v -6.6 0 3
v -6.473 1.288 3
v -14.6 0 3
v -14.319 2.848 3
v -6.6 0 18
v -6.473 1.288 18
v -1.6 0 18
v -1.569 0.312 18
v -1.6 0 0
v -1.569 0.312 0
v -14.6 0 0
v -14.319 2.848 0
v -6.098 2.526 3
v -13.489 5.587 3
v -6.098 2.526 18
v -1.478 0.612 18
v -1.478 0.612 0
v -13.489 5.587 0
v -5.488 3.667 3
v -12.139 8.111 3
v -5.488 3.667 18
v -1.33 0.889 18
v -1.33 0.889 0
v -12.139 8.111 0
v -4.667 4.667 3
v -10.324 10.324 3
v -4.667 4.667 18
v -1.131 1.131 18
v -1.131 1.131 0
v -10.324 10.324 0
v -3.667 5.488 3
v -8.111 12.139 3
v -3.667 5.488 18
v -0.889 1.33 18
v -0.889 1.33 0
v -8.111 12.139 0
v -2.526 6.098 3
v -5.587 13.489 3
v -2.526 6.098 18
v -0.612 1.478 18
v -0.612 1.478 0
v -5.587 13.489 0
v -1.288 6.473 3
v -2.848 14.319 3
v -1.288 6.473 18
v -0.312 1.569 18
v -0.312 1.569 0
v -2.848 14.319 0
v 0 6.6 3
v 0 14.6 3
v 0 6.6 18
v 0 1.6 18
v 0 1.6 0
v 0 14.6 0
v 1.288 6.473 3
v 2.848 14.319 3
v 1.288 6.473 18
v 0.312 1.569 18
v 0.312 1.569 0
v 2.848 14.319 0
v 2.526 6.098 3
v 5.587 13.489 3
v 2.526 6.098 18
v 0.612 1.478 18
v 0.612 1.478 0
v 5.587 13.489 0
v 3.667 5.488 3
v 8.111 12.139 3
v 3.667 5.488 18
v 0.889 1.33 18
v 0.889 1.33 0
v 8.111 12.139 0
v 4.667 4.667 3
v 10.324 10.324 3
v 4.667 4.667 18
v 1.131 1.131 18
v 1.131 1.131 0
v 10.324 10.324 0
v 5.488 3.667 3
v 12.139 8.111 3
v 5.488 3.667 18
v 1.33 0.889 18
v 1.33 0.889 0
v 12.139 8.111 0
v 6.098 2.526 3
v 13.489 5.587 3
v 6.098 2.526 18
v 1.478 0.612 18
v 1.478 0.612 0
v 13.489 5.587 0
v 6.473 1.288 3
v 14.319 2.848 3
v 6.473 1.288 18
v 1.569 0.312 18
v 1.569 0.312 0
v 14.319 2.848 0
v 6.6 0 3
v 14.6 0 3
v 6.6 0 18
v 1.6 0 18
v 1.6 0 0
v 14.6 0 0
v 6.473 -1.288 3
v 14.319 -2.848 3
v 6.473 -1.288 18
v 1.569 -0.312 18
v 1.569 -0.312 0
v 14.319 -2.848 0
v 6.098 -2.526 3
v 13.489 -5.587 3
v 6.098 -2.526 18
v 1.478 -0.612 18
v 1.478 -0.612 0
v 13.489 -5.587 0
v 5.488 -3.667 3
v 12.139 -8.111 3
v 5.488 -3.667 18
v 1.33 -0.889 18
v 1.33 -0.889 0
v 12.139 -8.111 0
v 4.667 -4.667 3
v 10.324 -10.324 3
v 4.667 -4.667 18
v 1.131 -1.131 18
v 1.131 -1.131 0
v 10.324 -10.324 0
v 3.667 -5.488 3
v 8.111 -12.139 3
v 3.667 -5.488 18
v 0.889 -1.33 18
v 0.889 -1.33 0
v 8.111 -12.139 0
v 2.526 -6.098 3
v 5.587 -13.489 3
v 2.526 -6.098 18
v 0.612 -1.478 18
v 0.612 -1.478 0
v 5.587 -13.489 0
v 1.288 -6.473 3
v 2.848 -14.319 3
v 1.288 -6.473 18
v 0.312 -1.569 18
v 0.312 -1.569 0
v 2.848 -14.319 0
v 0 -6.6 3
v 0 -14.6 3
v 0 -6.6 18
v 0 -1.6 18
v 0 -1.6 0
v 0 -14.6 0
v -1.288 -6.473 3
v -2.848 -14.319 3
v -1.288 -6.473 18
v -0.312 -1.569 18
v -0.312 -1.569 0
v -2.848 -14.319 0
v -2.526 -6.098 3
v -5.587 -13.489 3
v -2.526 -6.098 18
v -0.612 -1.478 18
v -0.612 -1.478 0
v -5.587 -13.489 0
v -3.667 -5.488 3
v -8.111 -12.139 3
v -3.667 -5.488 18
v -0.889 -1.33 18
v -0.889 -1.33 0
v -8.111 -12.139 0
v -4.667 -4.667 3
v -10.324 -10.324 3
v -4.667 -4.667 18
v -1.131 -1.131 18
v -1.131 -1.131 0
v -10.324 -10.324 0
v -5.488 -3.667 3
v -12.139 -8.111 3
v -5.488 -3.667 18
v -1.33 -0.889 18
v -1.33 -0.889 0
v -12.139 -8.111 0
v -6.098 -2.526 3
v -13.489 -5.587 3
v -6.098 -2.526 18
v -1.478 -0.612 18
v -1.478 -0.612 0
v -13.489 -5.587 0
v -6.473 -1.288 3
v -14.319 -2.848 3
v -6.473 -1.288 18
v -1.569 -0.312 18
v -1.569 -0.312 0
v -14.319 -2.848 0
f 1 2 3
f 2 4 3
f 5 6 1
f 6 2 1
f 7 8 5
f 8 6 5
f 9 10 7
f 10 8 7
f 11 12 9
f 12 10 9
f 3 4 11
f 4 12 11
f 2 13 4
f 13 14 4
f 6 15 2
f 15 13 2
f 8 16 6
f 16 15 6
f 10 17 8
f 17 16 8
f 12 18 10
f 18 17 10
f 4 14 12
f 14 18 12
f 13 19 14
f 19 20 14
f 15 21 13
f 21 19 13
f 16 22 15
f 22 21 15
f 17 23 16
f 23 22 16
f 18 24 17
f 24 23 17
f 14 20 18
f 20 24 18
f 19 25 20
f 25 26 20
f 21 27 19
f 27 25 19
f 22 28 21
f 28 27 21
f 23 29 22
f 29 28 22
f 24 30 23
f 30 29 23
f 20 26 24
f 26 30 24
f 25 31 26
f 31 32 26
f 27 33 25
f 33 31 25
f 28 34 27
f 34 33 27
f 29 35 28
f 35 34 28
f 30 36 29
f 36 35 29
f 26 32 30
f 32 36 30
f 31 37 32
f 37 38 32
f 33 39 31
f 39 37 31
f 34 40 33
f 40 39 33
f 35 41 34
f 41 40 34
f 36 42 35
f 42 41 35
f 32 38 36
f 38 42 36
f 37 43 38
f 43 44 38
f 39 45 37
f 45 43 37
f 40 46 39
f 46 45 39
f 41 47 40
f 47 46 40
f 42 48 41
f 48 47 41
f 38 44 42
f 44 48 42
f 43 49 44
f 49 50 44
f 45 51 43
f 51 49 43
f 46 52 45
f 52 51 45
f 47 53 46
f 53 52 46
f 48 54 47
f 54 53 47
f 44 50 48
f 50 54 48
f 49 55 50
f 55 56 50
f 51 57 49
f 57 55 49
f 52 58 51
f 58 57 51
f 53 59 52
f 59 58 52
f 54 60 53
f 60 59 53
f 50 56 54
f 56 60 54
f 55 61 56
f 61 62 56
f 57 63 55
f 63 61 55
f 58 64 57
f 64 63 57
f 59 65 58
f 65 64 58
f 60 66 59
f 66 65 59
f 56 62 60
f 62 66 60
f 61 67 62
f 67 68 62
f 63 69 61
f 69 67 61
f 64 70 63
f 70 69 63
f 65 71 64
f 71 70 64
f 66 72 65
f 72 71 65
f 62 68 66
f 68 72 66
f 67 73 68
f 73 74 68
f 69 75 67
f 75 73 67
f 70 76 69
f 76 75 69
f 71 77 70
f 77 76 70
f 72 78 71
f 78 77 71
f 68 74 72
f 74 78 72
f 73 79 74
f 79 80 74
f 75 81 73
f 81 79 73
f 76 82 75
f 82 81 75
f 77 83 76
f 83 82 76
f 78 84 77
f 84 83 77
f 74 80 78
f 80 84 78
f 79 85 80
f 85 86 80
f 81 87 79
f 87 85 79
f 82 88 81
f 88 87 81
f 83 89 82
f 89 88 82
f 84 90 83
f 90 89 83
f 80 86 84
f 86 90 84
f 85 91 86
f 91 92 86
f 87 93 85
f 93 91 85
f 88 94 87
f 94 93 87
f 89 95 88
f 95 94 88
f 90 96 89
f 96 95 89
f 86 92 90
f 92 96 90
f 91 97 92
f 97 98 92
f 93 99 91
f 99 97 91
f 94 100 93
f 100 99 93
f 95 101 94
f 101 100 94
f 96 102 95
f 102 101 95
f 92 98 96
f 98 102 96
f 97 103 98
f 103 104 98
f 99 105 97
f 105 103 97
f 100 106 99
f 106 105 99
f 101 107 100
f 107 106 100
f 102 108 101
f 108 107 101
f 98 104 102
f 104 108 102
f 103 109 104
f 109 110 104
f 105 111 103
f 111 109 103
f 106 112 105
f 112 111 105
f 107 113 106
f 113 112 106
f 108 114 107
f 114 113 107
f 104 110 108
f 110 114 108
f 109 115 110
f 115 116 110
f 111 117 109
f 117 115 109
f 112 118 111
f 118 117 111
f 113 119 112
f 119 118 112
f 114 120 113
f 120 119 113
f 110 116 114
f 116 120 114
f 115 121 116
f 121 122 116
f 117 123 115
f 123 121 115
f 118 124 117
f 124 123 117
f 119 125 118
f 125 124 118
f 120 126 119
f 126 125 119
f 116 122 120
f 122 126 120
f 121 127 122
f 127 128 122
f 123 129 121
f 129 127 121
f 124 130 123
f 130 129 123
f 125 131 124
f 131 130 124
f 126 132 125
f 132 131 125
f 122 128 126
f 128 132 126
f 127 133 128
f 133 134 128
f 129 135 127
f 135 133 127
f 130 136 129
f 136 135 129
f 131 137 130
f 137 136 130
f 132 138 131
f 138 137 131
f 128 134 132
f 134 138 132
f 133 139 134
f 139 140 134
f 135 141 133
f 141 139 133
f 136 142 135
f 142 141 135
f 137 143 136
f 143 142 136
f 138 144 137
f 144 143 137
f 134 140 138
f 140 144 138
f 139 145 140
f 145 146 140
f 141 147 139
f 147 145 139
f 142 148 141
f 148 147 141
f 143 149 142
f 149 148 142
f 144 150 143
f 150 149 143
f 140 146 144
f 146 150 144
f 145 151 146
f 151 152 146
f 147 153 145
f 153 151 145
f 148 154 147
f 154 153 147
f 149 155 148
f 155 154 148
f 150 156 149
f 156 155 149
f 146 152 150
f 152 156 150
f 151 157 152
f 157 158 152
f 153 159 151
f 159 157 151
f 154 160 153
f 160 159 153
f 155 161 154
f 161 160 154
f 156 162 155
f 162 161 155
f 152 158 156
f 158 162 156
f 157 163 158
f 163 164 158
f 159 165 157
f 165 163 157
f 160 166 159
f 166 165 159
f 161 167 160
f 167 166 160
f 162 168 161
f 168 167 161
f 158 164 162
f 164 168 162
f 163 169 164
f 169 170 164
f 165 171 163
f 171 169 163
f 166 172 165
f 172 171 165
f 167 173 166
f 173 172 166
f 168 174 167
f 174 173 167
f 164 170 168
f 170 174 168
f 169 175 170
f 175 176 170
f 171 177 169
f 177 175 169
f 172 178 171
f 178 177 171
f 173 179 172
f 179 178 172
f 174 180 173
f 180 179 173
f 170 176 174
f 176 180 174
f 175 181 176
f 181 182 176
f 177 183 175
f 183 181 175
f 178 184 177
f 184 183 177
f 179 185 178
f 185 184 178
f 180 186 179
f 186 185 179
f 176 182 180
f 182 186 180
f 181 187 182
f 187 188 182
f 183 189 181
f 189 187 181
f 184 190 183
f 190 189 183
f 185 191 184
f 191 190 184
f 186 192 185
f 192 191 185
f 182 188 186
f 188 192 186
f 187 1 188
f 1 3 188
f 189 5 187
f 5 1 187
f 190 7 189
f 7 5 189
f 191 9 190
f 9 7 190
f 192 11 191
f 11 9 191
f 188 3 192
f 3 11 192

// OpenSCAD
$fn = 32;

// ----------------------------------------------------------------------
// Profiled standoff: flanged spacer, 18 mm long, bore 3.2 mm
// ----------------------------------------------------------------------

// --- parameters (mm) ---
revolve_angle = 360;      // full turn around the Z axis
profile_points = 6;       // points of the closed outline

profile = [[1.6, 0], [14.6, 0], [14.6, 3], [6.6, 3], [6.6, 18], [1.6, 18]];  // single closed polygon, 6 points, counter clockwise

// --- the one profile operation ---
rotate_extrude(angle = revolve_angle) polygon(points = profile);
